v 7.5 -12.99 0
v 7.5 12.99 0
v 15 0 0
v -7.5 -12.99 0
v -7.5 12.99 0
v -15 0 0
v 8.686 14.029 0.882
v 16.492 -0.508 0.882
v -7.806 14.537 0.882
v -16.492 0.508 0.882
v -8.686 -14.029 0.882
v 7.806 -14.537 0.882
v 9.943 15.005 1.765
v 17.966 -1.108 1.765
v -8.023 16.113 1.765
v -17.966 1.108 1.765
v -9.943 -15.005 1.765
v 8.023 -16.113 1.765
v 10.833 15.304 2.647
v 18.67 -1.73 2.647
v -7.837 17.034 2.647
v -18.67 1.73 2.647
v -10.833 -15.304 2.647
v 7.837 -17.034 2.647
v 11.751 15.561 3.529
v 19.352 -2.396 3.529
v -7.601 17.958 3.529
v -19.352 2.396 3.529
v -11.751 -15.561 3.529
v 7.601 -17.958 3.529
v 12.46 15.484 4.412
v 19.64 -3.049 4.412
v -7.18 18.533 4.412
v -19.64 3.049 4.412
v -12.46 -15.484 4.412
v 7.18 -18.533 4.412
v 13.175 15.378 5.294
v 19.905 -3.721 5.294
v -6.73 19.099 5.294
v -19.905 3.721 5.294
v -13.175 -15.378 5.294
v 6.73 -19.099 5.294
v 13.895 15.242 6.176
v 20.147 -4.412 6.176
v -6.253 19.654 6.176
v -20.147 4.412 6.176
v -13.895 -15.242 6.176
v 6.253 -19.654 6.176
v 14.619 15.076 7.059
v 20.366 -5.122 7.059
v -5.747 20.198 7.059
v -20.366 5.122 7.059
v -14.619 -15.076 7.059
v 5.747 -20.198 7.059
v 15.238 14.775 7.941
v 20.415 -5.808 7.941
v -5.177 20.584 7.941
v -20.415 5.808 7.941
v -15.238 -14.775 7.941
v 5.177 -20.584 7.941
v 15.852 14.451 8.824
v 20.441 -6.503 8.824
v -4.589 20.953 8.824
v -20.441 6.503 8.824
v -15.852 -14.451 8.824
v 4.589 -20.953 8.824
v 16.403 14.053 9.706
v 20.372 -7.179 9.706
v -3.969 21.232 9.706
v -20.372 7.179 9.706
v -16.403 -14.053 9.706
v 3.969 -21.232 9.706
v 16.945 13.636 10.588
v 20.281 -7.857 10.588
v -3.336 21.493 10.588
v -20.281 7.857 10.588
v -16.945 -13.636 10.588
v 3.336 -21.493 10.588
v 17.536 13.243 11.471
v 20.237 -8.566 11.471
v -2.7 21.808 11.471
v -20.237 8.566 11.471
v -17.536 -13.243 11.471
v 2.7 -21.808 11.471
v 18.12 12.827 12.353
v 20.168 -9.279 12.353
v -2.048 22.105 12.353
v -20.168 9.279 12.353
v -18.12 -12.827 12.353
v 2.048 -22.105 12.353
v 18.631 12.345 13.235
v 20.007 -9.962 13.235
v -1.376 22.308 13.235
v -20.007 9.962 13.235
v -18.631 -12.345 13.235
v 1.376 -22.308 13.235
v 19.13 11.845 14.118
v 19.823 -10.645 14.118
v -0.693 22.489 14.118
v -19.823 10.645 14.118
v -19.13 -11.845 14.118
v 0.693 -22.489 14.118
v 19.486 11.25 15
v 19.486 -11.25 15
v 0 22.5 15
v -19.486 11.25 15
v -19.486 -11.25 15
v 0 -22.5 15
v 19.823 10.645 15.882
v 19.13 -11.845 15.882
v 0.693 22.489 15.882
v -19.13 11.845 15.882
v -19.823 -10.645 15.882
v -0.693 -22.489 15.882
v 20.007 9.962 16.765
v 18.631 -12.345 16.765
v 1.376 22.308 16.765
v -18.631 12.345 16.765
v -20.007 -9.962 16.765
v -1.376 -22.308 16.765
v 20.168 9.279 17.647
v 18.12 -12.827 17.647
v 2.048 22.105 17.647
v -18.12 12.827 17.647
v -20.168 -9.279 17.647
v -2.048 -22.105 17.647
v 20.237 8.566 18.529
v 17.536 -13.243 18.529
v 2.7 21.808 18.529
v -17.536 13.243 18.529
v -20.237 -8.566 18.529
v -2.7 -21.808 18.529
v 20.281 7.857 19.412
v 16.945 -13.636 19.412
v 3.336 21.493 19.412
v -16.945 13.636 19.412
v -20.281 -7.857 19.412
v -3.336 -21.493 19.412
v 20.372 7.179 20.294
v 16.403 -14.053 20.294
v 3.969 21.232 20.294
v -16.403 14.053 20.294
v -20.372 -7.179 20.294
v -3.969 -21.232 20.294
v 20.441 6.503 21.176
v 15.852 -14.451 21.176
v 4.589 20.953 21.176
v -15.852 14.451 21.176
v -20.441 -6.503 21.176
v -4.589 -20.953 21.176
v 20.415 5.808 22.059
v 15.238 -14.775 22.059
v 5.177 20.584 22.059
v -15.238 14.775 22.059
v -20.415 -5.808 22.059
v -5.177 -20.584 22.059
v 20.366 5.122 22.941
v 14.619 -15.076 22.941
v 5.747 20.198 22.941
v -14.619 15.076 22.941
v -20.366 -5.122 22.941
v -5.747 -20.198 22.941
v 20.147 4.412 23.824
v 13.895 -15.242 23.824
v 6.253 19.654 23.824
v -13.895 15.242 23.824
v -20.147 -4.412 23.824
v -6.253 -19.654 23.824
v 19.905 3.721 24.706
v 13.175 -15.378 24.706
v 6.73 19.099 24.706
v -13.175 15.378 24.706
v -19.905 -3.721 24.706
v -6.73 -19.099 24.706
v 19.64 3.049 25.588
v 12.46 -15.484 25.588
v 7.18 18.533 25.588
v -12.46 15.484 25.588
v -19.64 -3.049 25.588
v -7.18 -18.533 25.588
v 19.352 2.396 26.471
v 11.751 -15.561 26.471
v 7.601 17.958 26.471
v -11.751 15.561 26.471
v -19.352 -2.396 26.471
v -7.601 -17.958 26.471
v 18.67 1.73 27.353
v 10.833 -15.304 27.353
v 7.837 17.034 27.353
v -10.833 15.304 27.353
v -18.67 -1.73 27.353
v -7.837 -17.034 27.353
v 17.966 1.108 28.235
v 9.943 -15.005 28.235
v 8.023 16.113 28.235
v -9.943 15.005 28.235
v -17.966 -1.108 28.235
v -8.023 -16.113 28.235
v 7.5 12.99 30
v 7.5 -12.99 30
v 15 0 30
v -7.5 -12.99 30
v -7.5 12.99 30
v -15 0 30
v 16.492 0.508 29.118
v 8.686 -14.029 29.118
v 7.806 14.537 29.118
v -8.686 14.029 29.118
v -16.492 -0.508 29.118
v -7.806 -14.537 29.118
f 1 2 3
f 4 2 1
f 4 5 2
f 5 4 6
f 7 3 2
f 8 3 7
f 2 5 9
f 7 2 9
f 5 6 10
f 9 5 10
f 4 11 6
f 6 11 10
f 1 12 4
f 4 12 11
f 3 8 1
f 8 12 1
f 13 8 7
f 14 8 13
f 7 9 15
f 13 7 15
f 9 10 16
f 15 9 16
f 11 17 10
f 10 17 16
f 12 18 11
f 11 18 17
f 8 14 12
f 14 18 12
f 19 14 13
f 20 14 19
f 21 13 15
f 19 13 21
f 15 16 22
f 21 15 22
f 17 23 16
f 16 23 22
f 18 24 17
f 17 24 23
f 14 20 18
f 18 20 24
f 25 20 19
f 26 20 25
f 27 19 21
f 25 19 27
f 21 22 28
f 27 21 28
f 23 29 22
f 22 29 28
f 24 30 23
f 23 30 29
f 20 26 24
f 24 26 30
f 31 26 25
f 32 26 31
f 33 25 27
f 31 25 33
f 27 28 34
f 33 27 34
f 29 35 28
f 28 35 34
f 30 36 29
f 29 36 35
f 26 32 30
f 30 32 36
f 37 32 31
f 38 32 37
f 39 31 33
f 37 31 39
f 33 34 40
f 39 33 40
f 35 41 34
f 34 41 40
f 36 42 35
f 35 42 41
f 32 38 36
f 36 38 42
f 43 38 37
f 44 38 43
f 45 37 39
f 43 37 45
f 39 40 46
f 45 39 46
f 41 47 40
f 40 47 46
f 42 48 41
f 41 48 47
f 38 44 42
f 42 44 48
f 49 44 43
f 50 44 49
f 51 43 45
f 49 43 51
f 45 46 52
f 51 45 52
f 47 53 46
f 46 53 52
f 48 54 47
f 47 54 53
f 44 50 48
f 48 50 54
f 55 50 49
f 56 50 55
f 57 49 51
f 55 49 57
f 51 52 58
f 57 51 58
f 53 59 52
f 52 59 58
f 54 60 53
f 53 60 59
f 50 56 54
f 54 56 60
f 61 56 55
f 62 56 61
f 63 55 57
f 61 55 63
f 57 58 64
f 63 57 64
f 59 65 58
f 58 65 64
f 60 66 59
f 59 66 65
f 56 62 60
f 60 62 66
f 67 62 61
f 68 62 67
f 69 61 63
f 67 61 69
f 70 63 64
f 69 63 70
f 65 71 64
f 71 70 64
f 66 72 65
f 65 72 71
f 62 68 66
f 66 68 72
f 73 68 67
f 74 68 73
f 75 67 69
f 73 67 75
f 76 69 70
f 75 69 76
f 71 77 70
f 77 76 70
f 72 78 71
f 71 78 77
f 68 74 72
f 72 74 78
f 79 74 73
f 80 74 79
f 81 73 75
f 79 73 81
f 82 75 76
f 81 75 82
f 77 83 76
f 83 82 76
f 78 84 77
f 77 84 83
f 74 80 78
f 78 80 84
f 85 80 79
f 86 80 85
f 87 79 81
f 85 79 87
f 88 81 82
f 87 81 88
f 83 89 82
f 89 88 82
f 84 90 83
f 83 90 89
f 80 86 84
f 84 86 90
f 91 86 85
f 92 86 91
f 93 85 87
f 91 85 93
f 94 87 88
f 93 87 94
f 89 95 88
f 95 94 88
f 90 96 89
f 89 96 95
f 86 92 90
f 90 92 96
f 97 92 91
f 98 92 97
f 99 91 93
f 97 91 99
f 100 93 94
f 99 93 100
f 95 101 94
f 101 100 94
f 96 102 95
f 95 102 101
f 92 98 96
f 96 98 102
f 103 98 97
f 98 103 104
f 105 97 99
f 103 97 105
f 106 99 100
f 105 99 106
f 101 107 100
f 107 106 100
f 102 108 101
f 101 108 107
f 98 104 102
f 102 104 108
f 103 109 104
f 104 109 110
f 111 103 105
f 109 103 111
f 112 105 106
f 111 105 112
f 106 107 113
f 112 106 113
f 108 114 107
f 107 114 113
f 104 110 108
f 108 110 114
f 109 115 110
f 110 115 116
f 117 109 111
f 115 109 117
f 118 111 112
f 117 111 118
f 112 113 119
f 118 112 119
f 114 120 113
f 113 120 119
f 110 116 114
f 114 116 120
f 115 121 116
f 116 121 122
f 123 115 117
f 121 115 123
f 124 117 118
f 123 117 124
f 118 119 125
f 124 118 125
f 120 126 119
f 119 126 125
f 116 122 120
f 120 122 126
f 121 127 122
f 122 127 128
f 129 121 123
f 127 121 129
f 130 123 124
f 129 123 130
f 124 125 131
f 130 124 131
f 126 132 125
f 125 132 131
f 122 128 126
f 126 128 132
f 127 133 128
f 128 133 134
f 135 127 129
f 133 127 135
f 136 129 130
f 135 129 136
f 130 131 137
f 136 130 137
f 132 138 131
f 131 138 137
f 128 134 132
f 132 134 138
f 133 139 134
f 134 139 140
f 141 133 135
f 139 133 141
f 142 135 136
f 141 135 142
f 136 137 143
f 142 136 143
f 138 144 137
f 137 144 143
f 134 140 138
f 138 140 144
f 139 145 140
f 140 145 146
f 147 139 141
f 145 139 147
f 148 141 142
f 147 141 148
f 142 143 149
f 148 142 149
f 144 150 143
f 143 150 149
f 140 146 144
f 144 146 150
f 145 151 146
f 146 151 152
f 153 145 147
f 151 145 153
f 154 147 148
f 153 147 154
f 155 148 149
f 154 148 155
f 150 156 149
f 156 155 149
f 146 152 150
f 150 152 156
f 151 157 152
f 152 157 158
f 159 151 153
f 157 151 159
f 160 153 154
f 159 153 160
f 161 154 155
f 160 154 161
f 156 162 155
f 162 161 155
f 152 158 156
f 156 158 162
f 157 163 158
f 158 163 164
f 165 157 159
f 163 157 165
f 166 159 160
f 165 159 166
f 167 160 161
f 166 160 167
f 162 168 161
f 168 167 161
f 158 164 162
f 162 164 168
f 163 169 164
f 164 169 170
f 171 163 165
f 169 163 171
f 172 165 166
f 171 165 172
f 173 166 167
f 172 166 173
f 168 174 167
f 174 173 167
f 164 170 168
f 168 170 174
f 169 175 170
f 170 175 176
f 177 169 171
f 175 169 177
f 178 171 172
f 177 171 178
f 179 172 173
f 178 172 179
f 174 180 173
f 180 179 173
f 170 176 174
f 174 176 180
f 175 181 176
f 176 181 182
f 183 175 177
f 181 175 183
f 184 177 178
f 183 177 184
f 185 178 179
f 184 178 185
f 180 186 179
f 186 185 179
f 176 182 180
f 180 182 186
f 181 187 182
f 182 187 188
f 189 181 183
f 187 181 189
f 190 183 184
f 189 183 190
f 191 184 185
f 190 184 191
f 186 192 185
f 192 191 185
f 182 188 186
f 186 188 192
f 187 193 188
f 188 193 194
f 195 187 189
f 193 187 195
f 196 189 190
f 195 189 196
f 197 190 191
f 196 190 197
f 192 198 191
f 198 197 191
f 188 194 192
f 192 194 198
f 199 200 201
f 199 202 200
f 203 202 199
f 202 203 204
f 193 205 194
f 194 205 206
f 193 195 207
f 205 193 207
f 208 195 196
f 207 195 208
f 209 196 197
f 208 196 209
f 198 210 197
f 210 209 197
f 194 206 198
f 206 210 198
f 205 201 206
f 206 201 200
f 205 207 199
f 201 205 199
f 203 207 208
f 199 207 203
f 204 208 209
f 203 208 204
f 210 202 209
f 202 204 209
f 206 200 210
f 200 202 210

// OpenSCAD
//============================================================
// A twisty vase
//------------------------------------------------------------
$fn = 150 ;			// OpenSCAD Resolution


CurvedVase(sides=6, radius=15, height=30);

//------------------------------------------------------------
module CurvedVase(sides, radius, height)
{
    twist=360/sides;
    factors = GenerateFactors();
    radii = radius * factors;
    iterations = len(radii) - 1;
    for (i  = [0:iterations - 1]) {
        echo(i, radii[i], " -> ", radii[i+1]);
        // Get the scale to go from one radius to the next
        scale=radii[i+1]/radii[i];
        translate([0, 0, i * (height / iterations)]) {
            linear_extrude(
                height=height/iterations,
                twist=twist/iterations,
                scale=scale
            ) {
                rotate(-i * (twist / iterations)) {
                    circle(r=radii[i], $fn=sides);
                }
            }
        }
    }
}

function GenerateFactors() = [1, 1.2, 1.3, 1.35, 1.4, 1.43, 1.45, 1.48, 1.5, 1.5, 1.48, 1.45, 1.43, 1.4, 1.35, 1.3, 1.2, 1];
